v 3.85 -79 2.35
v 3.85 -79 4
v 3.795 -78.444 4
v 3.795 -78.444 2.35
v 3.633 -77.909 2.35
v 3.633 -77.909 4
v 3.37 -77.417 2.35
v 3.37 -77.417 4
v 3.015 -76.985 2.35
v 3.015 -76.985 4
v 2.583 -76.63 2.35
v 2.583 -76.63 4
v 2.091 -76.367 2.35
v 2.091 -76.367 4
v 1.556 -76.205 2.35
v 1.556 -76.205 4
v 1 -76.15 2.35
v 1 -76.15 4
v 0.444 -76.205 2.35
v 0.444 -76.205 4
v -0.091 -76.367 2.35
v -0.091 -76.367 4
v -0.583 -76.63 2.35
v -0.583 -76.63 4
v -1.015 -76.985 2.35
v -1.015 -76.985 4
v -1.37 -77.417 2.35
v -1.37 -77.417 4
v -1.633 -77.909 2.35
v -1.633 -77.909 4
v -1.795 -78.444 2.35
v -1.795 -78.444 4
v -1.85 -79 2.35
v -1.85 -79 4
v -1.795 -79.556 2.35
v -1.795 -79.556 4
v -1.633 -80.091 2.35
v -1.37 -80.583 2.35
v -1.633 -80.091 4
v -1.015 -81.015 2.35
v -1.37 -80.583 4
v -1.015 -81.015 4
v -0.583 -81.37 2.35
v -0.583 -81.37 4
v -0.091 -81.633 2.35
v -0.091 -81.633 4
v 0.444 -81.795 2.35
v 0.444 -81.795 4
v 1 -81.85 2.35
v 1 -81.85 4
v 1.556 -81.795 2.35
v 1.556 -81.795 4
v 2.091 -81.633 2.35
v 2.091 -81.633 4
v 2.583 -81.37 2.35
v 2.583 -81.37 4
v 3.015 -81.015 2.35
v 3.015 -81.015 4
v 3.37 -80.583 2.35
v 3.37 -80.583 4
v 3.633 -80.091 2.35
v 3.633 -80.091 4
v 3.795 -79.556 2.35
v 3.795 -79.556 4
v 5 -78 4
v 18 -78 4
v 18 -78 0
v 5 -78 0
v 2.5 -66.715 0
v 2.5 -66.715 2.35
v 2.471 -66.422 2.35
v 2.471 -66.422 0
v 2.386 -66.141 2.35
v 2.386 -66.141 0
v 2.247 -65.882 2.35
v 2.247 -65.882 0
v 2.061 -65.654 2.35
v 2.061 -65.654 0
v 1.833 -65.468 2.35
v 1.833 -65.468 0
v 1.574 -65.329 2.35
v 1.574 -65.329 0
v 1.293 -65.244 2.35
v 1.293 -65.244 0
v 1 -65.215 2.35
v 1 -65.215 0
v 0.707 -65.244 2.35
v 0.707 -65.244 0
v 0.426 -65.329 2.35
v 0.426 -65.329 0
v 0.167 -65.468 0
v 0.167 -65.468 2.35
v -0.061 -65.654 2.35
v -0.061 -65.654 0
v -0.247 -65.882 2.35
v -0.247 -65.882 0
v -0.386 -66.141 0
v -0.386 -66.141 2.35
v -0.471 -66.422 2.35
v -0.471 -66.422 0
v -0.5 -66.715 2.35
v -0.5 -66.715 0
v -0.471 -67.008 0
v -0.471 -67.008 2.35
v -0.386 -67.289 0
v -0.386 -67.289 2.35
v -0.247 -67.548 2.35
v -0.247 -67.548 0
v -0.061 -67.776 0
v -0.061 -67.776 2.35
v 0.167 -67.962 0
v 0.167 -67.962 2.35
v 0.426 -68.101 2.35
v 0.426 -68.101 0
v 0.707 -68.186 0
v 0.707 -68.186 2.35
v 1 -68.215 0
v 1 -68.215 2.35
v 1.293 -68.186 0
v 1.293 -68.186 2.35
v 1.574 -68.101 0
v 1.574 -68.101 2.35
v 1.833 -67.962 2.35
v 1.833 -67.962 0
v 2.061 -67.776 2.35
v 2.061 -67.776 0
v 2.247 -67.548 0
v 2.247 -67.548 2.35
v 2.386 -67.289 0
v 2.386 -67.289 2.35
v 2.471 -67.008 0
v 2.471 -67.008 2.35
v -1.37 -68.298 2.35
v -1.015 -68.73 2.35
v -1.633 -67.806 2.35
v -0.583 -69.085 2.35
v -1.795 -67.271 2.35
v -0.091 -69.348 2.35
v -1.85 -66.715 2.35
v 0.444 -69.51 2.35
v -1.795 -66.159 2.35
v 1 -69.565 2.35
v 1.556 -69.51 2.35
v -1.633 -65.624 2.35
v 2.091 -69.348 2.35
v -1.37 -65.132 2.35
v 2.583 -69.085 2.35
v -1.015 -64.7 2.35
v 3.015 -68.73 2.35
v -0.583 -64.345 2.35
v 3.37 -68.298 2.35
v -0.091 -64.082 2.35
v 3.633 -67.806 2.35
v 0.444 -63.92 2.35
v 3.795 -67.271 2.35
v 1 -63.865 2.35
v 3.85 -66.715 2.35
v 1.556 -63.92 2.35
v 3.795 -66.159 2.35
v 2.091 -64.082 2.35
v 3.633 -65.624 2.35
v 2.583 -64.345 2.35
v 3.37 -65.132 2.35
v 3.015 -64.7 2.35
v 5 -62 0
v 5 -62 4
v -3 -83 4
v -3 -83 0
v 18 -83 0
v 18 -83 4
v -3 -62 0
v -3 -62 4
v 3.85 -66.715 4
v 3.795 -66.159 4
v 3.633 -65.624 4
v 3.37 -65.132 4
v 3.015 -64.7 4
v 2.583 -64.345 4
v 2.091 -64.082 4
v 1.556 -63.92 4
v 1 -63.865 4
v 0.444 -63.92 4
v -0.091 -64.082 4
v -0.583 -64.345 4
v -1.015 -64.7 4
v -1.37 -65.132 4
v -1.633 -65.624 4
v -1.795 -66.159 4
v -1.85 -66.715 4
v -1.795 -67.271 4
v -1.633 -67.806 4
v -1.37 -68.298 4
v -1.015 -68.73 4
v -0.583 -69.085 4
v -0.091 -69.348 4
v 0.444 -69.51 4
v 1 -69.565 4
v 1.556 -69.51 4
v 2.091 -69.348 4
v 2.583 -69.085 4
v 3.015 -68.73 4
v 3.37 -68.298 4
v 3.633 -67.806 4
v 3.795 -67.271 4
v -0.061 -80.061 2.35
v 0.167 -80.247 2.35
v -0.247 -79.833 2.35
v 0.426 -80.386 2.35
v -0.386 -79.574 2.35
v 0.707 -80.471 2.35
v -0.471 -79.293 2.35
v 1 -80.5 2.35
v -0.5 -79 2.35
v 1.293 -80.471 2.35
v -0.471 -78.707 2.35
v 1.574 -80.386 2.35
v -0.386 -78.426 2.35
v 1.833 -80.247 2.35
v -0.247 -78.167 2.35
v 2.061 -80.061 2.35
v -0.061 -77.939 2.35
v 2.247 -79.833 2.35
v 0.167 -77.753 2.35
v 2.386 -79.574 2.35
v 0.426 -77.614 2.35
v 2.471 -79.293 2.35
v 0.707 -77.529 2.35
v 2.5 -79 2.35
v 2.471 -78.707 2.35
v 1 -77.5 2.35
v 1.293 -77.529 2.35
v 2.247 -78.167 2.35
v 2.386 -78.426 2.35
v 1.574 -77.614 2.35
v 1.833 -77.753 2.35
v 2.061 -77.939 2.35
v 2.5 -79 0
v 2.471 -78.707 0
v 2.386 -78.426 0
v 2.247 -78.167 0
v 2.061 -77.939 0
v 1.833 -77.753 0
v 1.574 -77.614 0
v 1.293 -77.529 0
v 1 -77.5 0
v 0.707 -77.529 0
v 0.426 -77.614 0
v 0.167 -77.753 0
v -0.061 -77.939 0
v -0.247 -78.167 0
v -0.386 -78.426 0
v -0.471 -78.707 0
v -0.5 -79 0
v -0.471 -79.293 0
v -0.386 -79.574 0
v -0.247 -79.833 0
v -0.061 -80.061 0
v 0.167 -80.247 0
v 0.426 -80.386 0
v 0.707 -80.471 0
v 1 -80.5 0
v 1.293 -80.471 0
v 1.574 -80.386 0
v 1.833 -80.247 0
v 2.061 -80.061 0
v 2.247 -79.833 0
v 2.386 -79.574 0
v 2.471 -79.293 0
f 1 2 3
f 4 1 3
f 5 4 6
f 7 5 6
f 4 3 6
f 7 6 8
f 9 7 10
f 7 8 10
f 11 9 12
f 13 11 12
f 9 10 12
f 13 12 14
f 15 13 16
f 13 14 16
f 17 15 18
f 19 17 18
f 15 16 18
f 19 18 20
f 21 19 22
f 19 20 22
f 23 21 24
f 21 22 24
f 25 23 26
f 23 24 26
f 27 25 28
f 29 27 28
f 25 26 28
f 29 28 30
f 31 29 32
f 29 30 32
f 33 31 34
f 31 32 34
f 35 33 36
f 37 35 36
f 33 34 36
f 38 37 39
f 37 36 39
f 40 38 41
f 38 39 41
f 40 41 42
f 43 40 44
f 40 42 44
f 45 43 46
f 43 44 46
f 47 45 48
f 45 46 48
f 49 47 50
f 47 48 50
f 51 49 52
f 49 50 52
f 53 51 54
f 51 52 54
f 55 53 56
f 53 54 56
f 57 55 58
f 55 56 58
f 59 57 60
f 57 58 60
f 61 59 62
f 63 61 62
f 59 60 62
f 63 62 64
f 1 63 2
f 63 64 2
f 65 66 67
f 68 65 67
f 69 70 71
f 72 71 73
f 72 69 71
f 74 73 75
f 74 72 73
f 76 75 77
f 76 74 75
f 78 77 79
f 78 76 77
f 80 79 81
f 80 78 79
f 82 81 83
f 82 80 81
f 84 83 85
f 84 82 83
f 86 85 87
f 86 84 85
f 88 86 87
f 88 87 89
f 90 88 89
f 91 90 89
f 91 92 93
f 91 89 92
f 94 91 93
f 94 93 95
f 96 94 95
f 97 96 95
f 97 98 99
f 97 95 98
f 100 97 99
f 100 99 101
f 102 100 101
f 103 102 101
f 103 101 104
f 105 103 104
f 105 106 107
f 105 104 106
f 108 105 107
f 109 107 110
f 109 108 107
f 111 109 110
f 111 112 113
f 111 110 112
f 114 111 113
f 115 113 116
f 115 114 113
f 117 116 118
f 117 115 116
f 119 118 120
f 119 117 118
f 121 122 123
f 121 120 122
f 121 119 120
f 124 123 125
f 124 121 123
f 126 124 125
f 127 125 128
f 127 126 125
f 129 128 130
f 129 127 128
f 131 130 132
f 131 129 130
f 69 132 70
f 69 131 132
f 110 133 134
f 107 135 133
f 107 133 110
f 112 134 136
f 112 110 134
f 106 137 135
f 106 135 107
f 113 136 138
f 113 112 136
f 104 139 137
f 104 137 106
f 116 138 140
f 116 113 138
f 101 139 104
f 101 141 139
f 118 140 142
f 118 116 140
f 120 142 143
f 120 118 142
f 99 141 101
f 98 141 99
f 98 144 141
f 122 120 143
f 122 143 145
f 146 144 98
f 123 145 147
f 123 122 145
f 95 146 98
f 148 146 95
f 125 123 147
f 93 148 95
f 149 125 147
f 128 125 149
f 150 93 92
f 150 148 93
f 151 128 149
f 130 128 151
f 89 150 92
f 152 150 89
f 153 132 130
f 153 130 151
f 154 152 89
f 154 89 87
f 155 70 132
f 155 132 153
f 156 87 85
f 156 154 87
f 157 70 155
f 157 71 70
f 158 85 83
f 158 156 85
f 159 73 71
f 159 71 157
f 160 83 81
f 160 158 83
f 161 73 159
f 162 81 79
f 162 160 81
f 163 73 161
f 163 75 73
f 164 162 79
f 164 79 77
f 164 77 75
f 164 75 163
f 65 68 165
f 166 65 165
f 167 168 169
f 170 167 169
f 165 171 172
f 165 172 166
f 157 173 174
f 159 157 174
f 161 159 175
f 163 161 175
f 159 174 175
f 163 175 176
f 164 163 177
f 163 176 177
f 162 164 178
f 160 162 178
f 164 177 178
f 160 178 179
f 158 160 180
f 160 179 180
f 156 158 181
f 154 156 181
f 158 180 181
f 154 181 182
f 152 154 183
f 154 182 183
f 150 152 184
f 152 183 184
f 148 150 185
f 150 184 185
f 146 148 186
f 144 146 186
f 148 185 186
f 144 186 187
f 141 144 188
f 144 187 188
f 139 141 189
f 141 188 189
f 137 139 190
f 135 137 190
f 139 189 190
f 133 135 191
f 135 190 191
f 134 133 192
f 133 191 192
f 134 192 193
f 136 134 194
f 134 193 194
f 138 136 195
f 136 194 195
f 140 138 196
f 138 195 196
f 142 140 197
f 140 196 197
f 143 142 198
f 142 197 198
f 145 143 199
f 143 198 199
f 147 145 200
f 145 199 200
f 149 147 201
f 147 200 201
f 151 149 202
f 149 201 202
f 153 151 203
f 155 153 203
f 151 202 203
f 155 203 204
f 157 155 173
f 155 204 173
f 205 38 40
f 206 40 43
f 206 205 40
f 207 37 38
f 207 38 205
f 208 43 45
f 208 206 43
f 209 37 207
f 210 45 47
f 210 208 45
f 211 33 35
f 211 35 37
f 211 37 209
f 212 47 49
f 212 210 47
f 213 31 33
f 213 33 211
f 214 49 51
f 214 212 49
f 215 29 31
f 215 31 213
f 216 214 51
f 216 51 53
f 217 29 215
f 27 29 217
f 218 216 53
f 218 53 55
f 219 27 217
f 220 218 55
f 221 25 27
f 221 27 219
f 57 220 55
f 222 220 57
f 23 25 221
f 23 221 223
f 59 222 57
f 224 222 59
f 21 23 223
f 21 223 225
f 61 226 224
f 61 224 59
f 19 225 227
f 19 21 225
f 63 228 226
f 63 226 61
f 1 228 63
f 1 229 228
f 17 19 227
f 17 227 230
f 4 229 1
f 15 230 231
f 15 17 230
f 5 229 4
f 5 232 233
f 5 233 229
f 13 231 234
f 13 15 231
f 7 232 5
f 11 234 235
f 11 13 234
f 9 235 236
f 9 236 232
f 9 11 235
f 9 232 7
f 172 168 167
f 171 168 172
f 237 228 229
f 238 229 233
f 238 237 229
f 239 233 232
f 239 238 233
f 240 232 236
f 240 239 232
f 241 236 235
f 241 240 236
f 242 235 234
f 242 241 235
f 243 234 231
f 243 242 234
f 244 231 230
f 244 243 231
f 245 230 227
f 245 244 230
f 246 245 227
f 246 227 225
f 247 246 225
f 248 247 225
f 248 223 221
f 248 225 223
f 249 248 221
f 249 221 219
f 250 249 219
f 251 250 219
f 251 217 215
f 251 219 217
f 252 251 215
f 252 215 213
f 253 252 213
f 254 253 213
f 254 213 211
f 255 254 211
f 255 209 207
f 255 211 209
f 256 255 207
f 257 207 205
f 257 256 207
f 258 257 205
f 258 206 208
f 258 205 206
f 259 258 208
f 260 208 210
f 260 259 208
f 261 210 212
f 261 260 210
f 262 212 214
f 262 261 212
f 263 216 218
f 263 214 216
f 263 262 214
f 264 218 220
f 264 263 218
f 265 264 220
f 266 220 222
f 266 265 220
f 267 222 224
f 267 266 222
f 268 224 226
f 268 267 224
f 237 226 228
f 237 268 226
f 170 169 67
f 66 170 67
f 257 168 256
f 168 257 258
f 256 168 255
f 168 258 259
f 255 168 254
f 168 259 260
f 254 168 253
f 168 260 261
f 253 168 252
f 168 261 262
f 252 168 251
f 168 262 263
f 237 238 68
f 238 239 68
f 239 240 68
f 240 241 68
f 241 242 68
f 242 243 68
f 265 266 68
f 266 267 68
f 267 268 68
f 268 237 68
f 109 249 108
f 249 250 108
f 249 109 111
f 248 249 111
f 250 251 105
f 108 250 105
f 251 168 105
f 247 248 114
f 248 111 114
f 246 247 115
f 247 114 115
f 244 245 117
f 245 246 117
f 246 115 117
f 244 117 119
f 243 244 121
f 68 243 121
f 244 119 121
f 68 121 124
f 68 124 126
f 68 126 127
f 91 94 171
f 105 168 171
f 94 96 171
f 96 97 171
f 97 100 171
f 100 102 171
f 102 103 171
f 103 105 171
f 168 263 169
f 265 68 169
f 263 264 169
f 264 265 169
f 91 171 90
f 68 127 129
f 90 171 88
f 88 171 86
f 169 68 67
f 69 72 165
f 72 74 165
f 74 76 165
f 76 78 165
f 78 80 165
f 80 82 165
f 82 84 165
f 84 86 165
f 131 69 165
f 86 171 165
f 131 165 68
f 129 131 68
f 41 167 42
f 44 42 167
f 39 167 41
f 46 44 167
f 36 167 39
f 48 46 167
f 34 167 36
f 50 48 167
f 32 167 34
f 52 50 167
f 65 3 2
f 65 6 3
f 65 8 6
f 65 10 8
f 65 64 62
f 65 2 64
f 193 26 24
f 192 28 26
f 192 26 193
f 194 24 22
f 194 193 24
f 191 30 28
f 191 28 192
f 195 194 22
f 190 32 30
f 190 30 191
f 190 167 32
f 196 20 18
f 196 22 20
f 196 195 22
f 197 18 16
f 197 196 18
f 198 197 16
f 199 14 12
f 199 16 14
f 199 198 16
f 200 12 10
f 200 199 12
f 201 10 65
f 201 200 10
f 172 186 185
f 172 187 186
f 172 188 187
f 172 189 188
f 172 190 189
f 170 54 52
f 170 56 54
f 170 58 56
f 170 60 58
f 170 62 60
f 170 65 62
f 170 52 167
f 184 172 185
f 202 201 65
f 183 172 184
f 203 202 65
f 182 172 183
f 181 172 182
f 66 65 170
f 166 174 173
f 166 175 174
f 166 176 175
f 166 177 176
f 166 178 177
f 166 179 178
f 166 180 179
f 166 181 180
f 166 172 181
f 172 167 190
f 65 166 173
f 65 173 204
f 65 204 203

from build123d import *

# Parameters (mm, degrees)
CROQUIS1_W              = 13
CROQUIS1_H              = 8
CROQUIS1_W_2            = 8
CROQUIS1_H_2            = 21
CROQUIS1_R              = 1.5
SALIENTE_EXTRUIR1_DEPTH = 4
CROQUIS2_R              = 2.85
CORTAR_EXTRUIR1_DEPTH   = 1.65
CROQUIS3_W              = 4
CROQUIS3_H              = 3
CORTAR_EXTRUIR2_DEPTH   = 13


with BuildPart() as part:
    # Croquis1 → Saliente-Extruir1 (new body)
    # profile 1 of 2: a face of its own
    with BuildSketch(Plane.XY):
        with Locations((11.5, -79)):
            Rectangle(CROQUIS1_W, CROQUIS1_H)
    # profile 2 of 2: a face of its own
    with BuildSketch(Plane.XY):
        with Locations((1, -72.5)):
            Rectangle(CROQUIS1_W_2, CROQUIS1_H_2)
        with Locations((1, -66.715045403)):
            Circle(CROQUIS1_R, mode=Mode.SUBTRACT)
        with Locations((1, -79)):
            Circle(CROQUIS1_R, mode=Mode.SUBTRACT)
    extrude(amount=SALIENTE_EXTRUIR1_DEPTH)

    # Croquis2 → Cortar-Extruir1 (cut)
    with BuildSketch(Plane.XY.offset(4)):
        with Locations((1, -79)):
            Circle(CROQUIS2_R)
        with Locations((1, -66.715045403)):
            Circle(CROQUIS2_R)
    extrude(amount=-CORTAR_EXTRUIR1_DEPTH, mode=Mode.SUBTRACT)

    # Croquis3 → Cortar-Extruir2 (cut)
    with BuildSketch(Plane(origin=(18, 0, 0), x_dir=(0, 0, -1), z_dir=(1, 0, 0))):
        with Locations((-2, -76.5)):
            Rectangle(CROQUIS3_W, CROQUIS3_H)
    extrude(amount=-CORTAR_EXTRUIR2_DEPTH, mode=Mode.SUBTRACT)


solid = part.part
